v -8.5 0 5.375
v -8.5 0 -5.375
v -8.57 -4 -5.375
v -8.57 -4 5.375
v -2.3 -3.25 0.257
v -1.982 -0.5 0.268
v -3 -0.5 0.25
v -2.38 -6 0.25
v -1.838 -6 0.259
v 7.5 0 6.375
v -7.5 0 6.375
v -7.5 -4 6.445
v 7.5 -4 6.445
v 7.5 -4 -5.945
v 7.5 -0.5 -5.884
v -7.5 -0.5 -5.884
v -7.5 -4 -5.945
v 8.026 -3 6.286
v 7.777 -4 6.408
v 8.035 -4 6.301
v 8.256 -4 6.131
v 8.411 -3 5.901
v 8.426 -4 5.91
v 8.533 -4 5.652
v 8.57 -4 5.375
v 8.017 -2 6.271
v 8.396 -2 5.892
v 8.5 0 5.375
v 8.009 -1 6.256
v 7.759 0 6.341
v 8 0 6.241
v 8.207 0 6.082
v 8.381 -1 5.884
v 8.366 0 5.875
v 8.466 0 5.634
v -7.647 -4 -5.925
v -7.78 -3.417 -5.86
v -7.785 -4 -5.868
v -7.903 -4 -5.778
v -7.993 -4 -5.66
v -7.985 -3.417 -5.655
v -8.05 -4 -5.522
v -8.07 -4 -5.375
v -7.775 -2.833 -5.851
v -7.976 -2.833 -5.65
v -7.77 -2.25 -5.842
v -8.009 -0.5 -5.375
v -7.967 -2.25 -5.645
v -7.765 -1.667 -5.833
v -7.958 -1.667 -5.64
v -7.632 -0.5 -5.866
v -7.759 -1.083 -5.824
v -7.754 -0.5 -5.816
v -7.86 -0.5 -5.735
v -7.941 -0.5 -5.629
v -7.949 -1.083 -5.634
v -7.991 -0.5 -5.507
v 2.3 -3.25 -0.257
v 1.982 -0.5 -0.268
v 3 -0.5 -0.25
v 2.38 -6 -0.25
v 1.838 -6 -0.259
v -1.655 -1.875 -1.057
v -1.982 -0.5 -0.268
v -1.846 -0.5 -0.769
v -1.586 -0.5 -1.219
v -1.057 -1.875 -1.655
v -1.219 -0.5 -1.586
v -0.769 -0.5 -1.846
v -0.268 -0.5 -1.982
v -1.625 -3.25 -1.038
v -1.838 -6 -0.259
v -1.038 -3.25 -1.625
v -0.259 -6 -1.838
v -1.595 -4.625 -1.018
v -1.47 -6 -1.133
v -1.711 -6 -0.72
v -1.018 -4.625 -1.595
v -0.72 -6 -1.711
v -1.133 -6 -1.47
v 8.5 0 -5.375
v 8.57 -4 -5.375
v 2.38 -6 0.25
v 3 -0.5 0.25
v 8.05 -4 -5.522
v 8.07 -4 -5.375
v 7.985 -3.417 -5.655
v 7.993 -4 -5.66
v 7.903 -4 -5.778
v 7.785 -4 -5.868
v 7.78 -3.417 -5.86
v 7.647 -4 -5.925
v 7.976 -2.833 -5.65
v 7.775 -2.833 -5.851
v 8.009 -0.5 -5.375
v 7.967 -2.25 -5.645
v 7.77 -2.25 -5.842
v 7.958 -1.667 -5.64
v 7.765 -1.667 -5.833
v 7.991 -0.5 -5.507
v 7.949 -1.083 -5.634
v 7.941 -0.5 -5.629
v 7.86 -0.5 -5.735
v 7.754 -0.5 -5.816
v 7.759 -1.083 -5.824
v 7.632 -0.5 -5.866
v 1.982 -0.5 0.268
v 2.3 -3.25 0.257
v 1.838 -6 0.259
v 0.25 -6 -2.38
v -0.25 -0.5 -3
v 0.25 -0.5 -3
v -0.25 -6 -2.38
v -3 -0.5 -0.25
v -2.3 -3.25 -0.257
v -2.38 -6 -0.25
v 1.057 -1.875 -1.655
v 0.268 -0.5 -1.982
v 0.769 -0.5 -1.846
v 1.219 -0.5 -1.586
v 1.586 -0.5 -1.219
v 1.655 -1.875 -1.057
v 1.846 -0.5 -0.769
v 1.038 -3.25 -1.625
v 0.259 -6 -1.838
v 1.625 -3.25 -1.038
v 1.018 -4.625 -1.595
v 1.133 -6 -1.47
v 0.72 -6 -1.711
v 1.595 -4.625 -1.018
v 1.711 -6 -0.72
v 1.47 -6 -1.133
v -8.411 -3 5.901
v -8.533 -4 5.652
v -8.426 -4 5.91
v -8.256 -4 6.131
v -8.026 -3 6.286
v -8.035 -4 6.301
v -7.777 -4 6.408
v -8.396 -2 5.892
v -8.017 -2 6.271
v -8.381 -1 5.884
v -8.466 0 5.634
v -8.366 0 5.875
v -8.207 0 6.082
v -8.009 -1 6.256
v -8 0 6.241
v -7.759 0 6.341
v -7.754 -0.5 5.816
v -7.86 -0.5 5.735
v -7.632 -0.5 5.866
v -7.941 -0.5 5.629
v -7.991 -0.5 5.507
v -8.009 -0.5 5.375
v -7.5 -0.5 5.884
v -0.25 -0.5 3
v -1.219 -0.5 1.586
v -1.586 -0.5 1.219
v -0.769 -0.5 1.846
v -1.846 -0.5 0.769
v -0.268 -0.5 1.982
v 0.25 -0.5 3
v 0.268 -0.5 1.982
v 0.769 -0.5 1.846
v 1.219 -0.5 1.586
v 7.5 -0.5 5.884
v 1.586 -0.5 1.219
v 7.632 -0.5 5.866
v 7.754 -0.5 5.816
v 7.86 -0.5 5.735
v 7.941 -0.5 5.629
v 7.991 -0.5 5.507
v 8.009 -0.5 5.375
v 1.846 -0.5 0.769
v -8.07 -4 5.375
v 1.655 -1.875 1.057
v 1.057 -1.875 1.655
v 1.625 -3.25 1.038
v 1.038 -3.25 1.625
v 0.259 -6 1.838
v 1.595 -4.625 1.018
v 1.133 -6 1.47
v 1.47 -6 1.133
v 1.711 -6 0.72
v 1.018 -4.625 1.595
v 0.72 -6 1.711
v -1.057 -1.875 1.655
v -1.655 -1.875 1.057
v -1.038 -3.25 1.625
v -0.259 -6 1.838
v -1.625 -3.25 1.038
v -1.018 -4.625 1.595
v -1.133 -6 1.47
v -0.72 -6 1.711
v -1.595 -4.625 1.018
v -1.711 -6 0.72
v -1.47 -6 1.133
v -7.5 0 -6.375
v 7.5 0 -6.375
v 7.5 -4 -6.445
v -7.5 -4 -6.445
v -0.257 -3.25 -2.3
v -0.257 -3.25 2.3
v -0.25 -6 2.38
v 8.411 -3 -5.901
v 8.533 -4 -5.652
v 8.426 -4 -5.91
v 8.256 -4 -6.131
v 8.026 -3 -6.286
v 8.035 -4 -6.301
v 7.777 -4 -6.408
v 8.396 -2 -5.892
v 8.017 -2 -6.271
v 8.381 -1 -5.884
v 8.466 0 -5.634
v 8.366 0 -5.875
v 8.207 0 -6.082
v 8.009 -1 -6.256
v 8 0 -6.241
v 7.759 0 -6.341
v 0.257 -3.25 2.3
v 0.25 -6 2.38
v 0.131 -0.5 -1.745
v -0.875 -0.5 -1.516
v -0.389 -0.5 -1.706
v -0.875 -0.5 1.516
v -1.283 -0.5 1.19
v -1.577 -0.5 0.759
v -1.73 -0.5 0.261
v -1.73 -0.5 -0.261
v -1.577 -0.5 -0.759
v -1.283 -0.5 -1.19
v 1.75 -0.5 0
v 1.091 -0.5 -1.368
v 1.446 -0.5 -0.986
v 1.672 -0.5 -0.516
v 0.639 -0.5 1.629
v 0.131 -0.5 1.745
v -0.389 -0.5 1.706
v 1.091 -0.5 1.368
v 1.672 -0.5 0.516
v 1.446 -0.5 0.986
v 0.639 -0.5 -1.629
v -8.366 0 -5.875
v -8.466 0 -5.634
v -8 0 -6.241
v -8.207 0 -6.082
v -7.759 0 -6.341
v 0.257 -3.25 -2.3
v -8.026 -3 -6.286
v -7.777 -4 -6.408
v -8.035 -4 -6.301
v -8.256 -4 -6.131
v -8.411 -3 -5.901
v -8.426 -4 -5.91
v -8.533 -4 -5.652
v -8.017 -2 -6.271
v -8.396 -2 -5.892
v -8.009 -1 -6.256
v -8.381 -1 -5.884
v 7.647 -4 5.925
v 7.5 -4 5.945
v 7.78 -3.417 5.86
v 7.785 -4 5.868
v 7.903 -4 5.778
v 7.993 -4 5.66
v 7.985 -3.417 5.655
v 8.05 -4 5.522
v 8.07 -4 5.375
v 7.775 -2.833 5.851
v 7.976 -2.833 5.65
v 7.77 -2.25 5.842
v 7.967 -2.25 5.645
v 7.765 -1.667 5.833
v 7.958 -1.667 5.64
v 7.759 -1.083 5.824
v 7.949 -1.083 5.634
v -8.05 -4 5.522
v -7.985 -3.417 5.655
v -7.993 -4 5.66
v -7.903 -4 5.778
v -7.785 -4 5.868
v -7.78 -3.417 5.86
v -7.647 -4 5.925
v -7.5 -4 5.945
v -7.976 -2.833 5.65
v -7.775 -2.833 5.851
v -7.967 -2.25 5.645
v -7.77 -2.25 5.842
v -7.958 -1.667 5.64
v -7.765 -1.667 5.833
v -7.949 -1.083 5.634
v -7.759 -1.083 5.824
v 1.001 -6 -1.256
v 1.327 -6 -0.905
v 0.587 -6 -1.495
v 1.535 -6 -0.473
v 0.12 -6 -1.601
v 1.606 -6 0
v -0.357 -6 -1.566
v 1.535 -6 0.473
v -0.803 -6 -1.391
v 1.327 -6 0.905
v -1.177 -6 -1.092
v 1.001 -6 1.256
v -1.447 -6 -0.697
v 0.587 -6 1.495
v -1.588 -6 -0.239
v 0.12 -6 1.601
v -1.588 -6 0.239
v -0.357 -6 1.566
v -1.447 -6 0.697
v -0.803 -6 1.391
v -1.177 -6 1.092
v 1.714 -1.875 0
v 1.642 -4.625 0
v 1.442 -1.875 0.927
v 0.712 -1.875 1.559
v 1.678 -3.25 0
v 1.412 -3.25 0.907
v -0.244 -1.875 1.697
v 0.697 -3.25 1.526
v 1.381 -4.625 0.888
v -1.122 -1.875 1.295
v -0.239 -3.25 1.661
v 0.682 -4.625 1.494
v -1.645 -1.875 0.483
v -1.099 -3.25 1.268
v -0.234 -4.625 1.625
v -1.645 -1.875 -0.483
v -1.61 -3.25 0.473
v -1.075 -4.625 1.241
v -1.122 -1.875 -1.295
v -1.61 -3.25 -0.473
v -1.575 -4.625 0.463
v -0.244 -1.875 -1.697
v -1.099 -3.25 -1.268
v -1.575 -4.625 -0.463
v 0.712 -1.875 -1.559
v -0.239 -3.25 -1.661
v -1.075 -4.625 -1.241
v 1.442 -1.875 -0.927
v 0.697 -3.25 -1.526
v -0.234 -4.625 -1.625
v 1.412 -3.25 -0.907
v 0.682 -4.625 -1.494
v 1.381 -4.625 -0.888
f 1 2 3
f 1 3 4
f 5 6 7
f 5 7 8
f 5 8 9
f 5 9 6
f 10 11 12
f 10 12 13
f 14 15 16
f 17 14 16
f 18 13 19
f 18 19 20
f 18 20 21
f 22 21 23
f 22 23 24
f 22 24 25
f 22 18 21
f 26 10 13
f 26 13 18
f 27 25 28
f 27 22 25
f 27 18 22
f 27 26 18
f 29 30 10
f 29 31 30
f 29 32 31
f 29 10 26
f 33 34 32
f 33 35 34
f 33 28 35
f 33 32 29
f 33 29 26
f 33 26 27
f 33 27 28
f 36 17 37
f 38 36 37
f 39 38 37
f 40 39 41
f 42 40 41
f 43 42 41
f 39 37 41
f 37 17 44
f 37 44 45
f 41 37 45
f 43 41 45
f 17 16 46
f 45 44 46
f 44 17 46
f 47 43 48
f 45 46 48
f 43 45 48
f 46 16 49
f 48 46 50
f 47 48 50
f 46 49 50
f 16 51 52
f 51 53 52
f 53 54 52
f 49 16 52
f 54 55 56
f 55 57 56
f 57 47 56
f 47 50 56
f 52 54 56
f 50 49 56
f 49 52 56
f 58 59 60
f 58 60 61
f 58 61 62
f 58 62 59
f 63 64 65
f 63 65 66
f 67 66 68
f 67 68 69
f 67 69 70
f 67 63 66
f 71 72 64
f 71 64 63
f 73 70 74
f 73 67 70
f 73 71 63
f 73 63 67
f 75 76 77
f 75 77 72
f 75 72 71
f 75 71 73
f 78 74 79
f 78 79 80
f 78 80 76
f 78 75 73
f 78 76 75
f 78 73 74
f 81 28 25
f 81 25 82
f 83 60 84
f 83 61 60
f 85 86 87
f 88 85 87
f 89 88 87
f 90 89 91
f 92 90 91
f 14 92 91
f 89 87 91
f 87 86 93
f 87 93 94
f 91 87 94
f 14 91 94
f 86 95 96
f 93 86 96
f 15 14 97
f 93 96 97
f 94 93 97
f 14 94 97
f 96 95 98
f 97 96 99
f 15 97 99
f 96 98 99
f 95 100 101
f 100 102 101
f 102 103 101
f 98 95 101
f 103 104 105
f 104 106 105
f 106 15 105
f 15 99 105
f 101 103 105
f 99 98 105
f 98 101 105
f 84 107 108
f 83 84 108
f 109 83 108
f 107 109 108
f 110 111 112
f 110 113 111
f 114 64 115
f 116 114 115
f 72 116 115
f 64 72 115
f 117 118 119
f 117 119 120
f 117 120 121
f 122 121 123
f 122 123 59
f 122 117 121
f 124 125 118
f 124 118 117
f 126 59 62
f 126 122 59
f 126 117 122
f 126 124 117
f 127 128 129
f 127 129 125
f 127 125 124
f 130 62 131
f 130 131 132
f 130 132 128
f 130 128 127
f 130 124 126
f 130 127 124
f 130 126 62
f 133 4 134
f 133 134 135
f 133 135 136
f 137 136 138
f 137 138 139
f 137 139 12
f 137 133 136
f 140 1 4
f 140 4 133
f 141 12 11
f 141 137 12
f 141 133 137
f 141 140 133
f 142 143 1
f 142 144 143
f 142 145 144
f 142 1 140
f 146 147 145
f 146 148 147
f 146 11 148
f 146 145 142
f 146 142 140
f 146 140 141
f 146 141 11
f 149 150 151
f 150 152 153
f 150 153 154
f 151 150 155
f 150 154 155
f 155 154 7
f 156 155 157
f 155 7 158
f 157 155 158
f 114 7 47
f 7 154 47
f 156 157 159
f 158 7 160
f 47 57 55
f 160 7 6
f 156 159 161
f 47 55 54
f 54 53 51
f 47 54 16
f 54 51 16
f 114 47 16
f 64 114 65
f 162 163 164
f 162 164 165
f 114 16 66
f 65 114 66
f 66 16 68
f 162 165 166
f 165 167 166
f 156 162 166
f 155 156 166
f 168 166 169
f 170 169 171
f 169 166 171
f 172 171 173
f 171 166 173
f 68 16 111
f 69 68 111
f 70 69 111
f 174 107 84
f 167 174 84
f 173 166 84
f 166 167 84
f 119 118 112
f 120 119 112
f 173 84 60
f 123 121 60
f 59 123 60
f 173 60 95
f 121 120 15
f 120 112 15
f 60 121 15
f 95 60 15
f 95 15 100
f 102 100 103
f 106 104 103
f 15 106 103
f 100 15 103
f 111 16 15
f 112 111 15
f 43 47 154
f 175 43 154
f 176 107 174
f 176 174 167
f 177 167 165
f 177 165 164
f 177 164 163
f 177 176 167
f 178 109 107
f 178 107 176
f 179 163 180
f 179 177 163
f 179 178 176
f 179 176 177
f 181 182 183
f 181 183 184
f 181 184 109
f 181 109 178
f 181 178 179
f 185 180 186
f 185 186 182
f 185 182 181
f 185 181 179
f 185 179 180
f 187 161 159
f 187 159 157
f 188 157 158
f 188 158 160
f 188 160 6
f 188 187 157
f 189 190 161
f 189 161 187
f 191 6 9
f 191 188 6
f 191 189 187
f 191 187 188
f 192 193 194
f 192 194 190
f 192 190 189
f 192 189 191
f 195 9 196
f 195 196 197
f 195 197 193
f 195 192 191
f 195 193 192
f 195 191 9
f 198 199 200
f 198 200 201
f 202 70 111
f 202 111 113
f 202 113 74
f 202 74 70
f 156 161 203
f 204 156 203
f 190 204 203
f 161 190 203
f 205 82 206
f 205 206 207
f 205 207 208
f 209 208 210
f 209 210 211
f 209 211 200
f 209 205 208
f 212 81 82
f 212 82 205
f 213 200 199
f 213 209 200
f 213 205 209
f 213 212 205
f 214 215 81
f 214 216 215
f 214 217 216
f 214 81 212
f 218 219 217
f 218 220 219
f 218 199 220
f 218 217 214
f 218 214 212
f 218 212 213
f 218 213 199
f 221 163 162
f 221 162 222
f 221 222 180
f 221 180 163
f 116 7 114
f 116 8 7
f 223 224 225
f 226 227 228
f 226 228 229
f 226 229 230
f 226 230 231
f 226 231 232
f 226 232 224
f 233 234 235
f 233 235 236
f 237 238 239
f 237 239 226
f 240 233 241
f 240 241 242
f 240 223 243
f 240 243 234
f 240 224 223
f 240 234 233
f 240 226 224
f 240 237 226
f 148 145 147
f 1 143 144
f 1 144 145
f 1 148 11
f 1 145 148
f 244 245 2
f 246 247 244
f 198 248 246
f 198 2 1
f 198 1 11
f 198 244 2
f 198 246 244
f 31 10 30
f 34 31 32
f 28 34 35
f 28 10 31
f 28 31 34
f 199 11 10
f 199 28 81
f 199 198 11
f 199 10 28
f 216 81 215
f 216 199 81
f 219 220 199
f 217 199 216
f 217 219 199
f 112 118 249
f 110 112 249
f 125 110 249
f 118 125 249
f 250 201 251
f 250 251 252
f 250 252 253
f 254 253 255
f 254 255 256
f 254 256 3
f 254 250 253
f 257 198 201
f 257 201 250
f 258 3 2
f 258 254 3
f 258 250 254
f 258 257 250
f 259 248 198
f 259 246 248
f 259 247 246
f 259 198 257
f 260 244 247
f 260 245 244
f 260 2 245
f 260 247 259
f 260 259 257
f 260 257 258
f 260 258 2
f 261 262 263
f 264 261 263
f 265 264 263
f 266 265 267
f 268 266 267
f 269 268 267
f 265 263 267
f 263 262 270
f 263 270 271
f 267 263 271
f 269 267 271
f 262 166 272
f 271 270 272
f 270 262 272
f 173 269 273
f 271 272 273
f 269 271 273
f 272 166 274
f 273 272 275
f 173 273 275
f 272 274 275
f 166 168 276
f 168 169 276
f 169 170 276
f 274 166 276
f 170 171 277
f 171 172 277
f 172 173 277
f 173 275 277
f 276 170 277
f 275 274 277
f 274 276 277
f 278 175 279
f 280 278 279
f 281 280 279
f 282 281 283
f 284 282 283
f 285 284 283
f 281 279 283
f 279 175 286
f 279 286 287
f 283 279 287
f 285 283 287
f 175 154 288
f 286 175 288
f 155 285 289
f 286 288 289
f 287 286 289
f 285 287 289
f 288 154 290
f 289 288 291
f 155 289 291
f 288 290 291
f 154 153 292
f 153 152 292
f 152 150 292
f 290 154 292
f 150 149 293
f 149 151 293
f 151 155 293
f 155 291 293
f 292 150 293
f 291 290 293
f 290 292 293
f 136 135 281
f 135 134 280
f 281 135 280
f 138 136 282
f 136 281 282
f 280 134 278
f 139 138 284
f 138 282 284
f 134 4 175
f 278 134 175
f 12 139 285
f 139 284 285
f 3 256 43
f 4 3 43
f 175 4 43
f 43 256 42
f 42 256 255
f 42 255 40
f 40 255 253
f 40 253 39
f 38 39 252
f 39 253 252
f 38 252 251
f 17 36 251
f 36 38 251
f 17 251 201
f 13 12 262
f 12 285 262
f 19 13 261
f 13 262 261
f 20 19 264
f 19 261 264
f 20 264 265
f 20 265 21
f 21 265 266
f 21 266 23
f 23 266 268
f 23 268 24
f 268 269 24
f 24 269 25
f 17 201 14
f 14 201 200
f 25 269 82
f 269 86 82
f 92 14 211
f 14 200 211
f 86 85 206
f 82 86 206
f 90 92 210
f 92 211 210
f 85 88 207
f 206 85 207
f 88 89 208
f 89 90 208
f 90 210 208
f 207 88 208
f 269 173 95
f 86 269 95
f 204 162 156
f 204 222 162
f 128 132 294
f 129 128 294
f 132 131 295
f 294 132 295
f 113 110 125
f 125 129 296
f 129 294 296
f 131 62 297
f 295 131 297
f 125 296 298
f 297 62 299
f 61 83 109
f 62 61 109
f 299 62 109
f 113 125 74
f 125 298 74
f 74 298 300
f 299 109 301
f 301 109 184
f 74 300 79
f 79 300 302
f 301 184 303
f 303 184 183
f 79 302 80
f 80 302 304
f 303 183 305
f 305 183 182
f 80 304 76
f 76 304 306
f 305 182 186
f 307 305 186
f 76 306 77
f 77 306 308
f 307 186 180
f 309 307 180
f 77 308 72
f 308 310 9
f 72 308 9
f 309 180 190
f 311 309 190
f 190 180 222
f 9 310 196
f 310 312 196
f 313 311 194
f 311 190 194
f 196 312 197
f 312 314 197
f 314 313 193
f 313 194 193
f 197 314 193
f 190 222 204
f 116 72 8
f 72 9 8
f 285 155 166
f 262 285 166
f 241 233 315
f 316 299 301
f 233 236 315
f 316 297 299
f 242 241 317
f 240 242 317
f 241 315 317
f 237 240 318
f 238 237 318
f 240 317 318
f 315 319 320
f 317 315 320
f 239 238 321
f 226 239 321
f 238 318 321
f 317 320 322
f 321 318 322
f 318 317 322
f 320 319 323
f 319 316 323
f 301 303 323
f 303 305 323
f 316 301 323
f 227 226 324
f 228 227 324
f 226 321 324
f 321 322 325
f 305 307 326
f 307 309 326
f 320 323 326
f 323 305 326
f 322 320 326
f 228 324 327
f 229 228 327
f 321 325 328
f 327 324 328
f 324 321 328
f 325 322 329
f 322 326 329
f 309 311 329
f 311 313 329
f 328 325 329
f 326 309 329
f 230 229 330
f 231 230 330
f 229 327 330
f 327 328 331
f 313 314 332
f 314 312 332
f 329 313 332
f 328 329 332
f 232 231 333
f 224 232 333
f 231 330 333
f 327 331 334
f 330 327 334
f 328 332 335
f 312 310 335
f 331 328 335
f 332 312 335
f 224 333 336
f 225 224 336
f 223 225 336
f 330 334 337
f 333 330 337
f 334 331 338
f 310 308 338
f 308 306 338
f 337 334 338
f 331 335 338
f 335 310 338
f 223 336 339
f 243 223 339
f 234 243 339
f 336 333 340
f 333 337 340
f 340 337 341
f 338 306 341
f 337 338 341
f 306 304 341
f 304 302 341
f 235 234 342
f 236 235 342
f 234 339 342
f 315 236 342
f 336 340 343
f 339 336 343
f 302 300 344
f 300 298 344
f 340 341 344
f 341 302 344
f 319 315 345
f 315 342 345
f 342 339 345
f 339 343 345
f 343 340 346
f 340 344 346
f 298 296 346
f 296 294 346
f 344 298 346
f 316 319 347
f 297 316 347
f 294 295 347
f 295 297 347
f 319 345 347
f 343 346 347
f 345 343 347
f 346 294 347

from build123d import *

# Parameters (mm, degrees)
BOSS_EXTRUDE1_DEPTH = 4
BOSS_EXTRUDE1_DRAFT = 1
SHELL1_T            = -0.5
SKETCH2_R           = 2
BOSS_EXTRUDE2_DEPTH = 5.5
BOSS_EXTRUDE2_TAPER = 1.5
CIRPATTERN1_COUNT   = 4
SKETCH4_R           = 1.605977431
CUT_EXTRUDE1_DEPTH  = 5.5
CUT_EXTRUDE1_DRAFT  = 1.5


with BuildPart() as part:
    # Sketch1 → Boss-Extrude1 (with draft: the straight prism first)
    with BuildSketch(Plane(origin=(0, 0, 0), x_dir=(1, 0, 0), z_dir=(0, 1, 0))):
        with BuildLine():
            Line((-7.5, -6.375), (7.5, -6.375))
            ThreePointArc((7.5, -6.375), (8.207106781, -6.082106781), (8.5, -5.375))
            Line((8.5, -5.375), (8.5, 5.375))
            ThreePointArc((8.5, 5.375), (8.207106781, 6.082106781), (7.5, 6.375))
            Line((7.5, 6.375), (-7.5, 6.375))
            ThreePointArc((-7.5, 6.375), (-8.207106781, 6.082106781), (-8.5, 5.375))
            Line((-8.5, 5.375), (-8.5, -5.375))
            ThreePointArc((-8.5, -5.375), (-8.207106781, -6.082106781), (-7.5, -6.375))
        make_face()
    extrude(amount=-BOSS_EXTRUDE1_DEPTH)
    # Boss-Extrude1: the draft: its side faces are tilted about the plane it starts from
    boss_extrude1_sides = [part.faces().sort_by_distance(p)[0] for p in [
        (0, -2, 6.375),
        (8.207106781, -2, 6.082106781),
        (8.5, -2, 0),
        (8.207106781, -2, -6.082106781),
        (0, -2, -6.375),
        (-8.207106781, -2, -6.082106781),
        (-8.5, -2, 0),
        (-8.207106781, -2, 6.082106781),
    ]]
    draft(boss_extrude1_sides, Plane(origin=(0, 0, 0), x_dir=(1, 0, 0), z_dir=(0, 1, 0)), BOSS_EXTRUDE1_DRAFT)

    # Shell1
    shell1_openings = [part.faces().sort_by_distance(p)[0] for p in [
        (0, -4, 0),
    ]]
    offset(amount=SHELL1_T, openings=shell1_openings, kind=Kind.INTERSECTION)

    # Sketch2 → Boss-Extrude2 (add)
    with BuildSketch(Plane.XZ.offset(0.5)):
        Circle(SKETCH2_R)
    extrude(amount=BOSS_EXTRUDE2_DEPTH, taper=BOSS_EXTRUDE2_TAPER)

    # Rib1: read off the stored shape, not the designer's step
    # Rib1: loft between two sections, ruled curve by curve
    rib1_from = [
        Edge.make_line((1.98200897, -0.5, 0.267657325), (3, -0.5, 0.25)),
        Edge.make_line((1.98200897, -0.5, -0.267657325), (3, -0.5, -0.25)),
        Edge.make_line((3, -0.5, -0.25), (3, -0.5, 0.25)),
        Edge.make_line((1.98200897, -0.5, -0.267657325), (1.98200897, -0.5, 0.267657325)),
    ]
    rib1_to = [
        Edge.make_line((1.837759395, -6, 0.259408234), (2.380168761, -6, 0.25)),
        Edge.make_line((1.837759395, -6, -0.259408234), (2.380168761, -6, -0.25)),
        Edge.make_line((2.380168761, -6, -0.25), (2.380168761, -6, 0.25)),
        Edge.make_line((1.837759395, -6, -0.259408234), (1.837759395, -6, 0.259408234)),
    ]
    rib1 = Solid(Shell([*[Face.make_surface_from_curves(rib1_from[k], rib1_to[k]) for k in range(4)], Face(Wire(rib1_from)), Face(Wire(rib1_to))]))
    add(rib1)

    # CirPattern1: Rib1 ×4 about axis
    cirpattern1_axis = Axis((0, 0, 0), (0, 1, 0))
    for i in range(1, CIRPATTERN1_COUNT):
        add(rib1.rotate(cirpattern1_axis, i * 360 / CIRPATTERN1_COUNT))


with BuildPart() as cut_extrude1_tool:
    # Sketch4 → Cut-Extrude1 (with draft: the straight prism first)
    with BuildSketch(Plane.XZ.offset(6)):
        Circle(SKETCH4_R)
    extrude(amount=-CUT_EXTRUDE1_DEPTH)
    # Cut-Extrude1: the draft: its side faces are tilted about the plane it starts from
    cut_extrude1_sides = [cut_extrude1_tool.faces().sort_by_distance(p)[0] for p in [
        (-1.605977431, -3.25, 0),
    ]]
    draft(cut_extrude1_sides, Plane.XZ.offset(6), CUT_EXTRUDE1_DRAFT)


with BuildPart() as part_1:
    add(part.part)

    # Cut-Extrude1: cut by cut_extrude1_tool
    add(cut_extrude1_tool.part, mode=Mode.SUBTRACT)


solid = part_1.part
